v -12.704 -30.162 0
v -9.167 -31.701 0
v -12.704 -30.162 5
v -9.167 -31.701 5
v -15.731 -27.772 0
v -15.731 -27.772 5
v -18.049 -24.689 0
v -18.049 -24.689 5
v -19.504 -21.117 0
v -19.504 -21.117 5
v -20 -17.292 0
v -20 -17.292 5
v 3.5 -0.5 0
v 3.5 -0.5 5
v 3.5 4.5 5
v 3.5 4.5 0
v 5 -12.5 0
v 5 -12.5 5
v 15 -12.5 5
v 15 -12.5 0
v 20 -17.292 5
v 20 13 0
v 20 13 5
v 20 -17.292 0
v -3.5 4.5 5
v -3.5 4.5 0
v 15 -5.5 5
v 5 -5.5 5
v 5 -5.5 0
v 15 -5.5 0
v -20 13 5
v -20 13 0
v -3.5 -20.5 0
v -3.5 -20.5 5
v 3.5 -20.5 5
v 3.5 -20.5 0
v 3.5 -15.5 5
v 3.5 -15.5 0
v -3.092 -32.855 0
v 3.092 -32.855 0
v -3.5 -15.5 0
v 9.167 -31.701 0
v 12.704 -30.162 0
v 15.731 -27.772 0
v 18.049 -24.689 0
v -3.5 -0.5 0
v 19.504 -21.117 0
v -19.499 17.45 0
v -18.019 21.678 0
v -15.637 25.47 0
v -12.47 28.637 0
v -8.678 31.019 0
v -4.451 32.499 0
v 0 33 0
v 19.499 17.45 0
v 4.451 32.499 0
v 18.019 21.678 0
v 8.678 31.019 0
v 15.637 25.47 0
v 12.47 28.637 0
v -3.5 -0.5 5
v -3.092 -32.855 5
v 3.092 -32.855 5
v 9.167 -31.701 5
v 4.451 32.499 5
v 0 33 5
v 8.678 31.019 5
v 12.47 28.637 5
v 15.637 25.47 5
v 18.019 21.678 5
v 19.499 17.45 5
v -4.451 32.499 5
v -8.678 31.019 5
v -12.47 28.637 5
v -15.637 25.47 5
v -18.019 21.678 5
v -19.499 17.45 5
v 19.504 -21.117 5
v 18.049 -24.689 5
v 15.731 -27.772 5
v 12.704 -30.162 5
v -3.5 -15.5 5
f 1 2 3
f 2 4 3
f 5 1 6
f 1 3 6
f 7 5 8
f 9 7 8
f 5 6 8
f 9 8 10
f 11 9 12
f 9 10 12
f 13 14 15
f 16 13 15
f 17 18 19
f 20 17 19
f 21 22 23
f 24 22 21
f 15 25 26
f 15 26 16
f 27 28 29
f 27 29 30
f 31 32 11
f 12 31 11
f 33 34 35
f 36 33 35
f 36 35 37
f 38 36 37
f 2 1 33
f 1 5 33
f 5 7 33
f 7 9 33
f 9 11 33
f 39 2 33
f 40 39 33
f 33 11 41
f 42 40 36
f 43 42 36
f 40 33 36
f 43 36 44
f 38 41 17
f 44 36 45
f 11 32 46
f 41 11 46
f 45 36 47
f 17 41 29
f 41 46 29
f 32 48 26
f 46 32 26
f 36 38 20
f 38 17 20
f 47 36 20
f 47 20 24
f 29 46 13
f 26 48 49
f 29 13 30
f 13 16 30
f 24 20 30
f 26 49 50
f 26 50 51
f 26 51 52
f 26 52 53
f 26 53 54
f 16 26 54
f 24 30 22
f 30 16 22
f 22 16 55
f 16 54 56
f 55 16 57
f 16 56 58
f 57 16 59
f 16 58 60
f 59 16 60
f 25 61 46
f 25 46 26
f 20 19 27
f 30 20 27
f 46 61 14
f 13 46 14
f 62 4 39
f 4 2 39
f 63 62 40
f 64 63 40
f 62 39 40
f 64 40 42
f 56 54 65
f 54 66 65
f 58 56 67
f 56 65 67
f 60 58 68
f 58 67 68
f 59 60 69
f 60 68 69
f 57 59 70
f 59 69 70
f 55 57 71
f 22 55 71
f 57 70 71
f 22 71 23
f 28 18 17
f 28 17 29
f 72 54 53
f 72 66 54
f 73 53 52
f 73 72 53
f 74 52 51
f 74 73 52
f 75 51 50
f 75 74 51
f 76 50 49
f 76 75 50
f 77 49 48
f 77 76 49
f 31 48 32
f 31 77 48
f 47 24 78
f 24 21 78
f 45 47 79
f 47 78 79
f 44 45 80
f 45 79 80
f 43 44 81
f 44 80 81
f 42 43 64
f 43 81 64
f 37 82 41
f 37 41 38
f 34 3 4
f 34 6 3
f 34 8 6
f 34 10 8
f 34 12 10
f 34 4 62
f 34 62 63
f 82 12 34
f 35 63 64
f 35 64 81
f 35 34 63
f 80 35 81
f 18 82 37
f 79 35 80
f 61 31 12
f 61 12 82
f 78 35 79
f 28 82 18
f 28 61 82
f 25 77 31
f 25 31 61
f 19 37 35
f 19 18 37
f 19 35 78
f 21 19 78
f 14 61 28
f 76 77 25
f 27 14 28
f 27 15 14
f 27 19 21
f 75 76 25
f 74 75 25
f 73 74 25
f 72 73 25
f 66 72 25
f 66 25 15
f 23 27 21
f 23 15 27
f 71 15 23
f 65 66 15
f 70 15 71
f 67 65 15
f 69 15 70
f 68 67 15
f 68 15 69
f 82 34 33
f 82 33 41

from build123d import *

# Parameters (mm, degrees)
SKETCH1_R           = 33
BOSS_EXTRUDE1_DEPTH = 5
CUT_EXTRUDE3_START  = -10
CUT_EXTRUDE3_DEPTH  = 10
FILLET2_R           = 20
FILLET3_R           = 15
SKETCH11_W          = 7
SKETCH11_H          = 5
CUT_EXTRUDE4_DEPTH  = 10
SKETCH12_W          = 10
SKETCH12_H          = 7
CUT_EXTRUDE5_DEPTH  = 10


with BuildPart() as part:
    # Sketch1 → Boss-Extrude1 (new body)
    with BuildSketch(Plane.XY):
        Circle(SKETCH1_R)
    extrude(amount=BOSS_EXTRUDE1_DEPTH)

    # Sketch10 → Cut-Extrude3 (cut)
    with BuildSketch(Plane.XY.offset(5).offset(CUT_EXTRUDE3_START)):
        with BuildLine():
            Line((-20, 26.248809497), (-20, -26.248809497))
            ThreePointArc((-20, -26.248809497), (-33, 0), (-20, 26.248809497))
        make_face()
        with BuildLine():
            Line((20, 26.248809497), (20, -26.248809497))
            ThreePointArc((20, -26.248809497), (33, 0), (20, 26.248809497))
        make_face()
    extrude(amount=CUT_EXTRUDE3_DEPTH, mode=Mode.SUBTRACT)

    # Fillet2
    fillet2_edges = [part.edges().sort_by_distance(p)[0] for p in [
        (-20, 26.248809497, 2.5),
        (20, 26.248809497, 2.5),
    ]]
    fillet(fillet2_edges, radius=FILLET2_R - 0.0001)  # a hair under: the kernel refuses the full size

    # Fillet3
    fillet3_edges = [part.edges().sort_by_distance(p)[0] for p in [
        (-20, -26.248809497, 2.5),
        (20, -26.248809497, 2.5),
    ]]
    fillet(fillet3_edges, radius=FILLET3_R)

    # Sketch11 → Cut-Extrude4 (cut)
    with BuildSketch(Plane.XY.offset(5)):
        with Locations((0, 2)):
            Rectangle(SKETCH11_W, SKETCH11_H)
        with Locations((0, -18)):
            Rectangle(SKETCH11_W, SKETCH11_H)
    extrude(amount=-CUT_EXTRUDE4_DEPTH, mode=Mode.SUBTRACT)

    # Sketch12 → Cut-Extrude5 (cut)
    with BuildSketch(Plane.XY.offset(5)):
        with Locations((10, -9)):
            Rectangle(SKETCH12_W, SKETCH12_H)
    extrude(amount=-CUT_EXTRUDE5_DEPTH, mode=Mode.SUBTRACT)


solid = part.part
